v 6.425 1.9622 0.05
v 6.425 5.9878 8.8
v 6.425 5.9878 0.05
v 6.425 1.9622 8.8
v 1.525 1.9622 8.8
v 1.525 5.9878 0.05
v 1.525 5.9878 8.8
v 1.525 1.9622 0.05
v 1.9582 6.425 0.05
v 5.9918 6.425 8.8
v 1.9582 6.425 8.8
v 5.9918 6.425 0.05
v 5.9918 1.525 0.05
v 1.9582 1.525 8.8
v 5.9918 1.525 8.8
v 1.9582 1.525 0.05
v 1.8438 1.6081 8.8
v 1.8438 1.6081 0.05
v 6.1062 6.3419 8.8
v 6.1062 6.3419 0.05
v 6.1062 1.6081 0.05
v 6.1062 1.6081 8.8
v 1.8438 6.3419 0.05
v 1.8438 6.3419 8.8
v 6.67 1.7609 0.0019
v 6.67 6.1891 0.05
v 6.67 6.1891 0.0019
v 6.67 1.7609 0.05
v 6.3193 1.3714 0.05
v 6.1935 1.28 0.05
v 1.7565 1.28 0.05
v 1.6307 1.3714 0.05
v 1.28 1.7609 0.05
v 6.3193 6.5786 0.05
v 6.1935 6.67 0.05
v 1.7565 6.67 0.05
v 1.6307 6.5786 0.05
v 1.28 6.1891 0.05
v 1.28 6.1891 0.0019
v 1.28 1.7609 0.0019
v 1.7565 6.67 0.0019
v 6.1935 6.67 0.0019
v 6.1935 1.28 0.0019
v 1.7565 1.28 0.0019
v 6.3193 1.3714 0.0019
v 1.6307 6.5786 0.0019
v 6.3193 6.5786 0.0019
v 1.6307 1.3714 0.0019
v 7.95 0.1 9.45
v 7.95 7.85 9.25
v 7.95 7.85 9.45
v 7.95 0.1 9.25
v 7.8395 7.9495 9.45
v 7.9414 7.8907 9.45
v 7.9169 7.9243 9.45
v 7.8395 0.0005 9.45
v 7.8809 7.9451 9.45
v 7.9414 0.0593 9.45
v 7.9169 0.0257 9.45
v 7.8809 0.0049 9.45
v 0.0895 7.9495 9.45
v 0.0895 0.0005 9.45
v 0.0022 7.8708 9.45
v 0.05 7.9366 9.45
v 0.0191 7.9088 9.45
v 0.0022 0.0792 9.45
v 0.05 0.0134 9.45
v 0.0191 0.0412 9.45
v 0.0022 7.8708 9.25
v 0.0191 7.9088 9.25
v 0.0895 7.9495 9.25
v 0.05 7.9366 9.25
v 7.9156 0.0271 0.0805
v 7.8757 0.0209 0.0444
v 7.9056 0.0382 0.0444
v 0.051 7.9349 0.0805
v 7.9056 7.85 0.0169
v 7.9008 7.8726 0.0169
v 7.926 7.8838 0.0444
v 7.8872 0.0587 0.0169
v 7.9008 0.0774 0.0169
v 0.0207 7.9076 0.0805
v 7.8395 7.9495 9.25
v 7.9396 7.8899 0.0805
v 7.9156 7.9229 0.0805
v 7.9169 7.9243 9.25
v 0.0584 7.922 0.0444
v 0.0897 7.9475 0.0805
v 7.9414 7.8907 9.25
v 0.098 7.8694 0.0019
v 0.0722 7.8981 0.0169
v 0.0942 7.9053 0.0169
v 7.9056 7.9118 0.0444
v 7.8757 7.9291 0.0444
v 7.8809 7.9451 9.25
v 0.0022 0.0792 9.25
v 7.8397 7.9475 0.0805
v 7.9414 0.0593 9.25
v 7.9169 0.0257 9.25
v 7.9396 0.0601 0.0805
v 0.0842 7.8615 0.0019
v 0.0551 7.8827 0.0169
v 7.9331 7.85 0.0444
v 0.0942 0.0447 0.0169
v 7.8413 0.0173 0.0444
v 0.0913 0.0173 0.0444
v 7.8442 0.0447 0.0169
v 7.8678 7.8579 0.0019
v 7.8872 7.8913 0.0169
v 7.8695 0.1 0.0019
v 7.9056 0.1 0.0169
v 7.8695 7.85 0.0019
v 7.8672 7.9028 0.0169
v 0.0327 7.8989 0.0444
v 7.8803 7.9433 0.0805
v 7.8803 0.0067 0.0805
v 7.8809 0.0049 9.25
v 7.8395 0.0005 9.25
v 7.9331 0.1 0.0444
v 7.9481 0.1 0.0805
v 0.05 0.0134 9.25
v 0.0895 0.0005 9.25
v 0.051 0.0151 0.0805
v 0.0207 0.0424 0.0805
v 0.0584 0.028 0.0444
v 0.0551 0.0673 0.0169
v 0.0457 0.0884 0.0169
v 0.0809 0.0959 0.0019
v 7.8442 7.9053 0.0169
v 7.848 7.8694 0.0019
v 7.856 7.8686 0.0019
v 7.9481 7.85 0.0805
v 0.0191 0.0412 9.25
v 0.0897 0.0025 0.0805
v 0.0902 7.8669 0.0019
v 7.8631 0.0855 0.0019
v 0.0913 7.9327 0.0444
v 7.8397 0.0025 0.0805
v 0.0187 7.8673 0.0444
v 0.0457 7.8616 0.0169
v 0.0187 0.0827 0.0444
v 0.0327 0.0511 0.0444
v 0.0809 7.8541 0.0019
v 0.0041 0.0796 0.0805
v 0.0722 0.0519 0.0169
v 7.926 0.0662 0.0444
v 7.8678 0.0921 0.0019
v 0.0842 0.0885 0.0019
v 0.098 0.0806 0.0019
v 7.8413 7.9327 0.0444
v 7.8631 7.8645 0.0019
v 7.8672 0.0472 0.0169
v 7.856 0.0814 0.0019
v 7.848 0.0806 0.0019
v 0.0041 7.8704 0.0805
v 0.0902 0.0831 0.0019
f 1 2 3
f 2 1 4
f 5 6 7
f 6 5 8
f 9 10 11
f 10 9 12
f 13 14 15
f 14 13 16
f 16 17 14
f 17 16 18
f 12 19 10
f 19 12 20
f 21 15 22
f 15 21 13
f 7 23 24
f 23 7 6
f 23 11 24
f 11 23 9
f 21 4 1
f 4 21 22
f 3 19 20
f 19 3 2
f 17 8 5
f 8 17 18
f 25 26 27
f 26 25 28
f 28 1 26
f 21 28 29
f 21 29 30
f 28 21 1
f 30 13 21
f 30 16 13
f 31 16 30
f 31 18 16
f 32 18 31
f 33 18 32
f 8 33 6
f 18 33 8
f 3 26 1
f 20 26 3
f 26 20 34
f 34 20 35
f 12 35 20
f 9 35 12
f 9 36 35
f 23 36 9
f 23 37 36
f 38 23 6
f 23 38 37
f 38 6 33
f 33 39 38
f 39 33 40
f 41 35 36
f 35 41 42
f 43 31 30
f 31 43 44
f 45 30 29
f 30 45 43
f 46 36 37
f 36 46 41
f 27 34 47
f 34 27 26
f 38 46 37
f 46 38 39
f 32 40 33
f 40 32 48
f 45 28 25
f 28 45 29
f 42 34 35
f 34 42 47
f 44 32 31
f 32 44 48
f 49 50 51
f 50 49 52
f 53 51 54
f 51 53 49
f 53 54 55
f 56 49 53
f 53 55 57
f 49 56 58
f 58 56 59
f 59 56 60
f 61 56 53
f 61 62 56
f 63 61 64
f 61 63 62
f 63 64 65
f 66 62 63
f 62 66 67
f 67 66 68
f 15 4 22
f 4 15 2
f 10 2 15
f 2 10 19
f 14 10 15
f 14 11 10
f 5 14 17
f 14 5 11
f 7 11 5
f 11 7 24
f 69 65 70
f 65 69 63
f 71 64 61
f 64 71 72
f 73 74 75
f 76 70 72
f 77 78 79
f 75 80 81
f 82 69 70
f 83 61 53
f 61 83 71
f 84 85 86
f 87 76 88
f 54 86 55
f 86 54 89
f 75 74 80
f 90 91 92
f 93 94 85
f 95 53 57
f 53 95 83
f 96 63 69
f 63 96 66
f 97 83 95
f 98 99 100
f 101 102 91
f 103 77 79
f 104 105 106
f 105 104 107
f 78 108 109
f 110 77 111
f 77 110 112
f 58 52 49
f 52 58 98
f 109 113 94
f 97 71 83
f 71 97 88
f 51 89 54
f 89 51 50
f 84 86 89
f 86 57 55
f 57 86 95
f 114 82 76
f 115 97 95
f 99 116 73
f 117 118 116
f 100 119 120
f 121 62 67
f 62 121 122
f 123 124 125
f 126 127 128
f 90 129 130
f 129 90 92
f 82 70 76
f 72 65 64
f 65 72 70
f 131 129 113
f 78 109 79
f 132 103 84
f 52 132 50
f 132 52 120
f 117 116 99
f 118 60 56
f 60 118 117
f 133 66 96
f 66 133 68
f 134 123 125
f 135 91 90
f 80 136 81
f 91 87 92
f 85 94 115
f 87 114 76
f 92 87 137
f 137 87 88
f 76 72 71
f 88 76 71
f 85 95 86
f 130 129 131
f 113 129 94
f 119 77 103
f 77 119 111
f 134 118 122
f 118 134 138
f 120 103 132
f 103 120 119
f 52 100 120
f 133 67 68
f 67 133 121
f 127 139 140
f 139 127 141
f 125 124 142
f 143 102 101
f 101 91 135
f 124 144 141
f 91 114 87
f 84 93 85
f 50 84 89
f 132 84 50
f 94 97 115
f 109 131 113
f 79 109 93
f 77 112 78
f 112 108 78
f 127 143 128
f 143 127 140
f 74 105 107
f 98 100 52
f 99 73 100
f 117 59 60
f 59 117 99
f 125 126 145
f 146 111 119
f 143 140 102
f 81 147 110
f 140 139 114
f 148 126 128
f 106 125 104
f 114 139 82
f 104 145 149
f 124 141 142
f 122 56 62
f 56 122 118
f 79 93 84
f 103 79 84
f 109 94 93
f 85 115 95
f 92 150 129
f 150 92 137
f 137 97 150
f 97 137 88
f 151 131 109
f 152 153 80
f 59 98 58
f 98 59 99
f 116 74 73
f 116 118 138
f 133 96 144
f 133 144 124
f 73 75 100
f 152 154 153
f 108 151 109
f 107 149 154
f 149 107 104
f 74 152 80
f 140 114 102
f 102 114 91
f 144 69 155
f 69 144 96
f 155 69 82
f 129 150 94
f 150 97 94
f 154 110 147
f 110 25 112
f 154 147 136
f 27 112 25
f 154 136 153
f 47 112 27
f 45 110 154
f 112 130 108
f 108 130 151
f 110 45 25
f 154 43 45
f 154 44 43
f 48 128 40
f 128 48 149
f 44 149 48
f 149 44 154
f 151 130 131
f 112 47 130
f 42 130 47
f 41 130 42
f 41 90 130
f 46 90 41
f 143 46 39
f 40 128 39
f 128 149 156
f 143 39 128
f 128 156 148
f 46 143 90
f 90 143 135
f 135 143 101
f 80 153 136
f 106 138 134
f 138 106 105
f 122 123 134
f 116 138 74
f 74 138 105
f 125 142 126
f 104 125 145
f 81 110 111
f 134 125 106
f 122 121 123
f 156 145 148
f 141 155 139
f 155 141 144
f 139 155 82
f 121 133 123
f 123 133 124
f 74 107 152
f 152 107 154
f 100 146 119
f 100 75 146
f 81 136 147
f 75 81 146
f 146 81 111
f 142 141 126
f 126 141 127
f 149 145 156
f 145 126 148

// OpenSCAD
// file: ../lib/roundedcube_simple.scad
module roundedcube_simple(size = [1, 1, 1], center = false, radius = 0.5, resolution = 20) {
	// If single value, convert to [x, y, z] vector
	size = (size[0] == undef) ? [size, size, size] : size;

	translate = (center == false) ?
		[radius, radius, radius] :
		[
			radius - (size[0] / 2),
			radius - (size[1] / 2),
			radius - (size[2] / 2)
	];

	translate(v = translate)
	minkowski() {
		cube(size = [
			size[0] - (radius * 2),
			size[1] - (radius * 2),
			size[2] - (radius * 2)
		]);
		sphere(r = radius, $fn = resolution);
	}
}
// file: ../lib/roundedcube.scad
// More information: https://danielupshaw.com/openscad-rounded-corners/

// Set to 0.01 for higher definition curves (renders slower)
$fs = 0.15;

module roundedcube(size = [1, 1, 1], center = false, radius = 0.5, apply_to = "all", resolution = 20) {
	// If single value, convert to [x, y, z] vector
	size = (size[0] == undef) ? [size, size, size] : size;

	translate_min = radius;
	translate_xmax = size[0] - radius;
	translate_ymax = size[1] - radius;
	translate_zmax = size[2] - radius;

	diameter = radius * 2;

	obj_translate = (center == false) ?
		[0, 0, 0] : [
			-(size[0] / 2),
			-(size[1] / 2),
			-(size[2] / 2)
		];

	translate(v = obj_translate) {
		hull() {
			for (translate_x = [translate_min, translate_xmax]) {
				x_at = (translate_x == translate_min) ? "min" : "max";
				for (translate_y = [translate_min, translate_ymax]) {
					y_at = (translate_y == translate_min) ? "min" : "max";
					for (translate_z = [translate_min, translate_zmax]) {
						z_at = (translate_z == translate_min) ? "min" : "max";

						translate(v = [translate_x, translate_y, translate_z])
						if (
							(apply_to == "all") ||
							(apply_to == "xmin" && x_at == "min") || (apply_to == "xmax" && x_at == "max") ||
							(apply_to == "ymin" && y_at == "min") || (apply_to == "ymax" && y_at == "max") ||
							(apply_to == "zmin" && z_at == "min") || (apply_to == "zmax" && z_at == "max")
						) {
							sphere(r = radius, $fn = resolution);
						} else {
							rotate = 
								(apply_to == "xmin" || apply_to == "xmax" || apply_to == "x") ? [0, 90, 0] : (
								(apply_to == "ymin" || apply_to == "ymax" || apply_to == "y") ? [90, 90, 0] :
								[0, 0, 0]
							);
							rotate(a = rotate)
							cylinder(h = diameter, r = radius, center = true, $fn = resolution);
						}
					}
				}
			}
		}
	}
}
// main file
echo(version=version());

include <../lib/block.scad>;

block(baseLayers=3, grid=[1,1], withKnobs=false);
